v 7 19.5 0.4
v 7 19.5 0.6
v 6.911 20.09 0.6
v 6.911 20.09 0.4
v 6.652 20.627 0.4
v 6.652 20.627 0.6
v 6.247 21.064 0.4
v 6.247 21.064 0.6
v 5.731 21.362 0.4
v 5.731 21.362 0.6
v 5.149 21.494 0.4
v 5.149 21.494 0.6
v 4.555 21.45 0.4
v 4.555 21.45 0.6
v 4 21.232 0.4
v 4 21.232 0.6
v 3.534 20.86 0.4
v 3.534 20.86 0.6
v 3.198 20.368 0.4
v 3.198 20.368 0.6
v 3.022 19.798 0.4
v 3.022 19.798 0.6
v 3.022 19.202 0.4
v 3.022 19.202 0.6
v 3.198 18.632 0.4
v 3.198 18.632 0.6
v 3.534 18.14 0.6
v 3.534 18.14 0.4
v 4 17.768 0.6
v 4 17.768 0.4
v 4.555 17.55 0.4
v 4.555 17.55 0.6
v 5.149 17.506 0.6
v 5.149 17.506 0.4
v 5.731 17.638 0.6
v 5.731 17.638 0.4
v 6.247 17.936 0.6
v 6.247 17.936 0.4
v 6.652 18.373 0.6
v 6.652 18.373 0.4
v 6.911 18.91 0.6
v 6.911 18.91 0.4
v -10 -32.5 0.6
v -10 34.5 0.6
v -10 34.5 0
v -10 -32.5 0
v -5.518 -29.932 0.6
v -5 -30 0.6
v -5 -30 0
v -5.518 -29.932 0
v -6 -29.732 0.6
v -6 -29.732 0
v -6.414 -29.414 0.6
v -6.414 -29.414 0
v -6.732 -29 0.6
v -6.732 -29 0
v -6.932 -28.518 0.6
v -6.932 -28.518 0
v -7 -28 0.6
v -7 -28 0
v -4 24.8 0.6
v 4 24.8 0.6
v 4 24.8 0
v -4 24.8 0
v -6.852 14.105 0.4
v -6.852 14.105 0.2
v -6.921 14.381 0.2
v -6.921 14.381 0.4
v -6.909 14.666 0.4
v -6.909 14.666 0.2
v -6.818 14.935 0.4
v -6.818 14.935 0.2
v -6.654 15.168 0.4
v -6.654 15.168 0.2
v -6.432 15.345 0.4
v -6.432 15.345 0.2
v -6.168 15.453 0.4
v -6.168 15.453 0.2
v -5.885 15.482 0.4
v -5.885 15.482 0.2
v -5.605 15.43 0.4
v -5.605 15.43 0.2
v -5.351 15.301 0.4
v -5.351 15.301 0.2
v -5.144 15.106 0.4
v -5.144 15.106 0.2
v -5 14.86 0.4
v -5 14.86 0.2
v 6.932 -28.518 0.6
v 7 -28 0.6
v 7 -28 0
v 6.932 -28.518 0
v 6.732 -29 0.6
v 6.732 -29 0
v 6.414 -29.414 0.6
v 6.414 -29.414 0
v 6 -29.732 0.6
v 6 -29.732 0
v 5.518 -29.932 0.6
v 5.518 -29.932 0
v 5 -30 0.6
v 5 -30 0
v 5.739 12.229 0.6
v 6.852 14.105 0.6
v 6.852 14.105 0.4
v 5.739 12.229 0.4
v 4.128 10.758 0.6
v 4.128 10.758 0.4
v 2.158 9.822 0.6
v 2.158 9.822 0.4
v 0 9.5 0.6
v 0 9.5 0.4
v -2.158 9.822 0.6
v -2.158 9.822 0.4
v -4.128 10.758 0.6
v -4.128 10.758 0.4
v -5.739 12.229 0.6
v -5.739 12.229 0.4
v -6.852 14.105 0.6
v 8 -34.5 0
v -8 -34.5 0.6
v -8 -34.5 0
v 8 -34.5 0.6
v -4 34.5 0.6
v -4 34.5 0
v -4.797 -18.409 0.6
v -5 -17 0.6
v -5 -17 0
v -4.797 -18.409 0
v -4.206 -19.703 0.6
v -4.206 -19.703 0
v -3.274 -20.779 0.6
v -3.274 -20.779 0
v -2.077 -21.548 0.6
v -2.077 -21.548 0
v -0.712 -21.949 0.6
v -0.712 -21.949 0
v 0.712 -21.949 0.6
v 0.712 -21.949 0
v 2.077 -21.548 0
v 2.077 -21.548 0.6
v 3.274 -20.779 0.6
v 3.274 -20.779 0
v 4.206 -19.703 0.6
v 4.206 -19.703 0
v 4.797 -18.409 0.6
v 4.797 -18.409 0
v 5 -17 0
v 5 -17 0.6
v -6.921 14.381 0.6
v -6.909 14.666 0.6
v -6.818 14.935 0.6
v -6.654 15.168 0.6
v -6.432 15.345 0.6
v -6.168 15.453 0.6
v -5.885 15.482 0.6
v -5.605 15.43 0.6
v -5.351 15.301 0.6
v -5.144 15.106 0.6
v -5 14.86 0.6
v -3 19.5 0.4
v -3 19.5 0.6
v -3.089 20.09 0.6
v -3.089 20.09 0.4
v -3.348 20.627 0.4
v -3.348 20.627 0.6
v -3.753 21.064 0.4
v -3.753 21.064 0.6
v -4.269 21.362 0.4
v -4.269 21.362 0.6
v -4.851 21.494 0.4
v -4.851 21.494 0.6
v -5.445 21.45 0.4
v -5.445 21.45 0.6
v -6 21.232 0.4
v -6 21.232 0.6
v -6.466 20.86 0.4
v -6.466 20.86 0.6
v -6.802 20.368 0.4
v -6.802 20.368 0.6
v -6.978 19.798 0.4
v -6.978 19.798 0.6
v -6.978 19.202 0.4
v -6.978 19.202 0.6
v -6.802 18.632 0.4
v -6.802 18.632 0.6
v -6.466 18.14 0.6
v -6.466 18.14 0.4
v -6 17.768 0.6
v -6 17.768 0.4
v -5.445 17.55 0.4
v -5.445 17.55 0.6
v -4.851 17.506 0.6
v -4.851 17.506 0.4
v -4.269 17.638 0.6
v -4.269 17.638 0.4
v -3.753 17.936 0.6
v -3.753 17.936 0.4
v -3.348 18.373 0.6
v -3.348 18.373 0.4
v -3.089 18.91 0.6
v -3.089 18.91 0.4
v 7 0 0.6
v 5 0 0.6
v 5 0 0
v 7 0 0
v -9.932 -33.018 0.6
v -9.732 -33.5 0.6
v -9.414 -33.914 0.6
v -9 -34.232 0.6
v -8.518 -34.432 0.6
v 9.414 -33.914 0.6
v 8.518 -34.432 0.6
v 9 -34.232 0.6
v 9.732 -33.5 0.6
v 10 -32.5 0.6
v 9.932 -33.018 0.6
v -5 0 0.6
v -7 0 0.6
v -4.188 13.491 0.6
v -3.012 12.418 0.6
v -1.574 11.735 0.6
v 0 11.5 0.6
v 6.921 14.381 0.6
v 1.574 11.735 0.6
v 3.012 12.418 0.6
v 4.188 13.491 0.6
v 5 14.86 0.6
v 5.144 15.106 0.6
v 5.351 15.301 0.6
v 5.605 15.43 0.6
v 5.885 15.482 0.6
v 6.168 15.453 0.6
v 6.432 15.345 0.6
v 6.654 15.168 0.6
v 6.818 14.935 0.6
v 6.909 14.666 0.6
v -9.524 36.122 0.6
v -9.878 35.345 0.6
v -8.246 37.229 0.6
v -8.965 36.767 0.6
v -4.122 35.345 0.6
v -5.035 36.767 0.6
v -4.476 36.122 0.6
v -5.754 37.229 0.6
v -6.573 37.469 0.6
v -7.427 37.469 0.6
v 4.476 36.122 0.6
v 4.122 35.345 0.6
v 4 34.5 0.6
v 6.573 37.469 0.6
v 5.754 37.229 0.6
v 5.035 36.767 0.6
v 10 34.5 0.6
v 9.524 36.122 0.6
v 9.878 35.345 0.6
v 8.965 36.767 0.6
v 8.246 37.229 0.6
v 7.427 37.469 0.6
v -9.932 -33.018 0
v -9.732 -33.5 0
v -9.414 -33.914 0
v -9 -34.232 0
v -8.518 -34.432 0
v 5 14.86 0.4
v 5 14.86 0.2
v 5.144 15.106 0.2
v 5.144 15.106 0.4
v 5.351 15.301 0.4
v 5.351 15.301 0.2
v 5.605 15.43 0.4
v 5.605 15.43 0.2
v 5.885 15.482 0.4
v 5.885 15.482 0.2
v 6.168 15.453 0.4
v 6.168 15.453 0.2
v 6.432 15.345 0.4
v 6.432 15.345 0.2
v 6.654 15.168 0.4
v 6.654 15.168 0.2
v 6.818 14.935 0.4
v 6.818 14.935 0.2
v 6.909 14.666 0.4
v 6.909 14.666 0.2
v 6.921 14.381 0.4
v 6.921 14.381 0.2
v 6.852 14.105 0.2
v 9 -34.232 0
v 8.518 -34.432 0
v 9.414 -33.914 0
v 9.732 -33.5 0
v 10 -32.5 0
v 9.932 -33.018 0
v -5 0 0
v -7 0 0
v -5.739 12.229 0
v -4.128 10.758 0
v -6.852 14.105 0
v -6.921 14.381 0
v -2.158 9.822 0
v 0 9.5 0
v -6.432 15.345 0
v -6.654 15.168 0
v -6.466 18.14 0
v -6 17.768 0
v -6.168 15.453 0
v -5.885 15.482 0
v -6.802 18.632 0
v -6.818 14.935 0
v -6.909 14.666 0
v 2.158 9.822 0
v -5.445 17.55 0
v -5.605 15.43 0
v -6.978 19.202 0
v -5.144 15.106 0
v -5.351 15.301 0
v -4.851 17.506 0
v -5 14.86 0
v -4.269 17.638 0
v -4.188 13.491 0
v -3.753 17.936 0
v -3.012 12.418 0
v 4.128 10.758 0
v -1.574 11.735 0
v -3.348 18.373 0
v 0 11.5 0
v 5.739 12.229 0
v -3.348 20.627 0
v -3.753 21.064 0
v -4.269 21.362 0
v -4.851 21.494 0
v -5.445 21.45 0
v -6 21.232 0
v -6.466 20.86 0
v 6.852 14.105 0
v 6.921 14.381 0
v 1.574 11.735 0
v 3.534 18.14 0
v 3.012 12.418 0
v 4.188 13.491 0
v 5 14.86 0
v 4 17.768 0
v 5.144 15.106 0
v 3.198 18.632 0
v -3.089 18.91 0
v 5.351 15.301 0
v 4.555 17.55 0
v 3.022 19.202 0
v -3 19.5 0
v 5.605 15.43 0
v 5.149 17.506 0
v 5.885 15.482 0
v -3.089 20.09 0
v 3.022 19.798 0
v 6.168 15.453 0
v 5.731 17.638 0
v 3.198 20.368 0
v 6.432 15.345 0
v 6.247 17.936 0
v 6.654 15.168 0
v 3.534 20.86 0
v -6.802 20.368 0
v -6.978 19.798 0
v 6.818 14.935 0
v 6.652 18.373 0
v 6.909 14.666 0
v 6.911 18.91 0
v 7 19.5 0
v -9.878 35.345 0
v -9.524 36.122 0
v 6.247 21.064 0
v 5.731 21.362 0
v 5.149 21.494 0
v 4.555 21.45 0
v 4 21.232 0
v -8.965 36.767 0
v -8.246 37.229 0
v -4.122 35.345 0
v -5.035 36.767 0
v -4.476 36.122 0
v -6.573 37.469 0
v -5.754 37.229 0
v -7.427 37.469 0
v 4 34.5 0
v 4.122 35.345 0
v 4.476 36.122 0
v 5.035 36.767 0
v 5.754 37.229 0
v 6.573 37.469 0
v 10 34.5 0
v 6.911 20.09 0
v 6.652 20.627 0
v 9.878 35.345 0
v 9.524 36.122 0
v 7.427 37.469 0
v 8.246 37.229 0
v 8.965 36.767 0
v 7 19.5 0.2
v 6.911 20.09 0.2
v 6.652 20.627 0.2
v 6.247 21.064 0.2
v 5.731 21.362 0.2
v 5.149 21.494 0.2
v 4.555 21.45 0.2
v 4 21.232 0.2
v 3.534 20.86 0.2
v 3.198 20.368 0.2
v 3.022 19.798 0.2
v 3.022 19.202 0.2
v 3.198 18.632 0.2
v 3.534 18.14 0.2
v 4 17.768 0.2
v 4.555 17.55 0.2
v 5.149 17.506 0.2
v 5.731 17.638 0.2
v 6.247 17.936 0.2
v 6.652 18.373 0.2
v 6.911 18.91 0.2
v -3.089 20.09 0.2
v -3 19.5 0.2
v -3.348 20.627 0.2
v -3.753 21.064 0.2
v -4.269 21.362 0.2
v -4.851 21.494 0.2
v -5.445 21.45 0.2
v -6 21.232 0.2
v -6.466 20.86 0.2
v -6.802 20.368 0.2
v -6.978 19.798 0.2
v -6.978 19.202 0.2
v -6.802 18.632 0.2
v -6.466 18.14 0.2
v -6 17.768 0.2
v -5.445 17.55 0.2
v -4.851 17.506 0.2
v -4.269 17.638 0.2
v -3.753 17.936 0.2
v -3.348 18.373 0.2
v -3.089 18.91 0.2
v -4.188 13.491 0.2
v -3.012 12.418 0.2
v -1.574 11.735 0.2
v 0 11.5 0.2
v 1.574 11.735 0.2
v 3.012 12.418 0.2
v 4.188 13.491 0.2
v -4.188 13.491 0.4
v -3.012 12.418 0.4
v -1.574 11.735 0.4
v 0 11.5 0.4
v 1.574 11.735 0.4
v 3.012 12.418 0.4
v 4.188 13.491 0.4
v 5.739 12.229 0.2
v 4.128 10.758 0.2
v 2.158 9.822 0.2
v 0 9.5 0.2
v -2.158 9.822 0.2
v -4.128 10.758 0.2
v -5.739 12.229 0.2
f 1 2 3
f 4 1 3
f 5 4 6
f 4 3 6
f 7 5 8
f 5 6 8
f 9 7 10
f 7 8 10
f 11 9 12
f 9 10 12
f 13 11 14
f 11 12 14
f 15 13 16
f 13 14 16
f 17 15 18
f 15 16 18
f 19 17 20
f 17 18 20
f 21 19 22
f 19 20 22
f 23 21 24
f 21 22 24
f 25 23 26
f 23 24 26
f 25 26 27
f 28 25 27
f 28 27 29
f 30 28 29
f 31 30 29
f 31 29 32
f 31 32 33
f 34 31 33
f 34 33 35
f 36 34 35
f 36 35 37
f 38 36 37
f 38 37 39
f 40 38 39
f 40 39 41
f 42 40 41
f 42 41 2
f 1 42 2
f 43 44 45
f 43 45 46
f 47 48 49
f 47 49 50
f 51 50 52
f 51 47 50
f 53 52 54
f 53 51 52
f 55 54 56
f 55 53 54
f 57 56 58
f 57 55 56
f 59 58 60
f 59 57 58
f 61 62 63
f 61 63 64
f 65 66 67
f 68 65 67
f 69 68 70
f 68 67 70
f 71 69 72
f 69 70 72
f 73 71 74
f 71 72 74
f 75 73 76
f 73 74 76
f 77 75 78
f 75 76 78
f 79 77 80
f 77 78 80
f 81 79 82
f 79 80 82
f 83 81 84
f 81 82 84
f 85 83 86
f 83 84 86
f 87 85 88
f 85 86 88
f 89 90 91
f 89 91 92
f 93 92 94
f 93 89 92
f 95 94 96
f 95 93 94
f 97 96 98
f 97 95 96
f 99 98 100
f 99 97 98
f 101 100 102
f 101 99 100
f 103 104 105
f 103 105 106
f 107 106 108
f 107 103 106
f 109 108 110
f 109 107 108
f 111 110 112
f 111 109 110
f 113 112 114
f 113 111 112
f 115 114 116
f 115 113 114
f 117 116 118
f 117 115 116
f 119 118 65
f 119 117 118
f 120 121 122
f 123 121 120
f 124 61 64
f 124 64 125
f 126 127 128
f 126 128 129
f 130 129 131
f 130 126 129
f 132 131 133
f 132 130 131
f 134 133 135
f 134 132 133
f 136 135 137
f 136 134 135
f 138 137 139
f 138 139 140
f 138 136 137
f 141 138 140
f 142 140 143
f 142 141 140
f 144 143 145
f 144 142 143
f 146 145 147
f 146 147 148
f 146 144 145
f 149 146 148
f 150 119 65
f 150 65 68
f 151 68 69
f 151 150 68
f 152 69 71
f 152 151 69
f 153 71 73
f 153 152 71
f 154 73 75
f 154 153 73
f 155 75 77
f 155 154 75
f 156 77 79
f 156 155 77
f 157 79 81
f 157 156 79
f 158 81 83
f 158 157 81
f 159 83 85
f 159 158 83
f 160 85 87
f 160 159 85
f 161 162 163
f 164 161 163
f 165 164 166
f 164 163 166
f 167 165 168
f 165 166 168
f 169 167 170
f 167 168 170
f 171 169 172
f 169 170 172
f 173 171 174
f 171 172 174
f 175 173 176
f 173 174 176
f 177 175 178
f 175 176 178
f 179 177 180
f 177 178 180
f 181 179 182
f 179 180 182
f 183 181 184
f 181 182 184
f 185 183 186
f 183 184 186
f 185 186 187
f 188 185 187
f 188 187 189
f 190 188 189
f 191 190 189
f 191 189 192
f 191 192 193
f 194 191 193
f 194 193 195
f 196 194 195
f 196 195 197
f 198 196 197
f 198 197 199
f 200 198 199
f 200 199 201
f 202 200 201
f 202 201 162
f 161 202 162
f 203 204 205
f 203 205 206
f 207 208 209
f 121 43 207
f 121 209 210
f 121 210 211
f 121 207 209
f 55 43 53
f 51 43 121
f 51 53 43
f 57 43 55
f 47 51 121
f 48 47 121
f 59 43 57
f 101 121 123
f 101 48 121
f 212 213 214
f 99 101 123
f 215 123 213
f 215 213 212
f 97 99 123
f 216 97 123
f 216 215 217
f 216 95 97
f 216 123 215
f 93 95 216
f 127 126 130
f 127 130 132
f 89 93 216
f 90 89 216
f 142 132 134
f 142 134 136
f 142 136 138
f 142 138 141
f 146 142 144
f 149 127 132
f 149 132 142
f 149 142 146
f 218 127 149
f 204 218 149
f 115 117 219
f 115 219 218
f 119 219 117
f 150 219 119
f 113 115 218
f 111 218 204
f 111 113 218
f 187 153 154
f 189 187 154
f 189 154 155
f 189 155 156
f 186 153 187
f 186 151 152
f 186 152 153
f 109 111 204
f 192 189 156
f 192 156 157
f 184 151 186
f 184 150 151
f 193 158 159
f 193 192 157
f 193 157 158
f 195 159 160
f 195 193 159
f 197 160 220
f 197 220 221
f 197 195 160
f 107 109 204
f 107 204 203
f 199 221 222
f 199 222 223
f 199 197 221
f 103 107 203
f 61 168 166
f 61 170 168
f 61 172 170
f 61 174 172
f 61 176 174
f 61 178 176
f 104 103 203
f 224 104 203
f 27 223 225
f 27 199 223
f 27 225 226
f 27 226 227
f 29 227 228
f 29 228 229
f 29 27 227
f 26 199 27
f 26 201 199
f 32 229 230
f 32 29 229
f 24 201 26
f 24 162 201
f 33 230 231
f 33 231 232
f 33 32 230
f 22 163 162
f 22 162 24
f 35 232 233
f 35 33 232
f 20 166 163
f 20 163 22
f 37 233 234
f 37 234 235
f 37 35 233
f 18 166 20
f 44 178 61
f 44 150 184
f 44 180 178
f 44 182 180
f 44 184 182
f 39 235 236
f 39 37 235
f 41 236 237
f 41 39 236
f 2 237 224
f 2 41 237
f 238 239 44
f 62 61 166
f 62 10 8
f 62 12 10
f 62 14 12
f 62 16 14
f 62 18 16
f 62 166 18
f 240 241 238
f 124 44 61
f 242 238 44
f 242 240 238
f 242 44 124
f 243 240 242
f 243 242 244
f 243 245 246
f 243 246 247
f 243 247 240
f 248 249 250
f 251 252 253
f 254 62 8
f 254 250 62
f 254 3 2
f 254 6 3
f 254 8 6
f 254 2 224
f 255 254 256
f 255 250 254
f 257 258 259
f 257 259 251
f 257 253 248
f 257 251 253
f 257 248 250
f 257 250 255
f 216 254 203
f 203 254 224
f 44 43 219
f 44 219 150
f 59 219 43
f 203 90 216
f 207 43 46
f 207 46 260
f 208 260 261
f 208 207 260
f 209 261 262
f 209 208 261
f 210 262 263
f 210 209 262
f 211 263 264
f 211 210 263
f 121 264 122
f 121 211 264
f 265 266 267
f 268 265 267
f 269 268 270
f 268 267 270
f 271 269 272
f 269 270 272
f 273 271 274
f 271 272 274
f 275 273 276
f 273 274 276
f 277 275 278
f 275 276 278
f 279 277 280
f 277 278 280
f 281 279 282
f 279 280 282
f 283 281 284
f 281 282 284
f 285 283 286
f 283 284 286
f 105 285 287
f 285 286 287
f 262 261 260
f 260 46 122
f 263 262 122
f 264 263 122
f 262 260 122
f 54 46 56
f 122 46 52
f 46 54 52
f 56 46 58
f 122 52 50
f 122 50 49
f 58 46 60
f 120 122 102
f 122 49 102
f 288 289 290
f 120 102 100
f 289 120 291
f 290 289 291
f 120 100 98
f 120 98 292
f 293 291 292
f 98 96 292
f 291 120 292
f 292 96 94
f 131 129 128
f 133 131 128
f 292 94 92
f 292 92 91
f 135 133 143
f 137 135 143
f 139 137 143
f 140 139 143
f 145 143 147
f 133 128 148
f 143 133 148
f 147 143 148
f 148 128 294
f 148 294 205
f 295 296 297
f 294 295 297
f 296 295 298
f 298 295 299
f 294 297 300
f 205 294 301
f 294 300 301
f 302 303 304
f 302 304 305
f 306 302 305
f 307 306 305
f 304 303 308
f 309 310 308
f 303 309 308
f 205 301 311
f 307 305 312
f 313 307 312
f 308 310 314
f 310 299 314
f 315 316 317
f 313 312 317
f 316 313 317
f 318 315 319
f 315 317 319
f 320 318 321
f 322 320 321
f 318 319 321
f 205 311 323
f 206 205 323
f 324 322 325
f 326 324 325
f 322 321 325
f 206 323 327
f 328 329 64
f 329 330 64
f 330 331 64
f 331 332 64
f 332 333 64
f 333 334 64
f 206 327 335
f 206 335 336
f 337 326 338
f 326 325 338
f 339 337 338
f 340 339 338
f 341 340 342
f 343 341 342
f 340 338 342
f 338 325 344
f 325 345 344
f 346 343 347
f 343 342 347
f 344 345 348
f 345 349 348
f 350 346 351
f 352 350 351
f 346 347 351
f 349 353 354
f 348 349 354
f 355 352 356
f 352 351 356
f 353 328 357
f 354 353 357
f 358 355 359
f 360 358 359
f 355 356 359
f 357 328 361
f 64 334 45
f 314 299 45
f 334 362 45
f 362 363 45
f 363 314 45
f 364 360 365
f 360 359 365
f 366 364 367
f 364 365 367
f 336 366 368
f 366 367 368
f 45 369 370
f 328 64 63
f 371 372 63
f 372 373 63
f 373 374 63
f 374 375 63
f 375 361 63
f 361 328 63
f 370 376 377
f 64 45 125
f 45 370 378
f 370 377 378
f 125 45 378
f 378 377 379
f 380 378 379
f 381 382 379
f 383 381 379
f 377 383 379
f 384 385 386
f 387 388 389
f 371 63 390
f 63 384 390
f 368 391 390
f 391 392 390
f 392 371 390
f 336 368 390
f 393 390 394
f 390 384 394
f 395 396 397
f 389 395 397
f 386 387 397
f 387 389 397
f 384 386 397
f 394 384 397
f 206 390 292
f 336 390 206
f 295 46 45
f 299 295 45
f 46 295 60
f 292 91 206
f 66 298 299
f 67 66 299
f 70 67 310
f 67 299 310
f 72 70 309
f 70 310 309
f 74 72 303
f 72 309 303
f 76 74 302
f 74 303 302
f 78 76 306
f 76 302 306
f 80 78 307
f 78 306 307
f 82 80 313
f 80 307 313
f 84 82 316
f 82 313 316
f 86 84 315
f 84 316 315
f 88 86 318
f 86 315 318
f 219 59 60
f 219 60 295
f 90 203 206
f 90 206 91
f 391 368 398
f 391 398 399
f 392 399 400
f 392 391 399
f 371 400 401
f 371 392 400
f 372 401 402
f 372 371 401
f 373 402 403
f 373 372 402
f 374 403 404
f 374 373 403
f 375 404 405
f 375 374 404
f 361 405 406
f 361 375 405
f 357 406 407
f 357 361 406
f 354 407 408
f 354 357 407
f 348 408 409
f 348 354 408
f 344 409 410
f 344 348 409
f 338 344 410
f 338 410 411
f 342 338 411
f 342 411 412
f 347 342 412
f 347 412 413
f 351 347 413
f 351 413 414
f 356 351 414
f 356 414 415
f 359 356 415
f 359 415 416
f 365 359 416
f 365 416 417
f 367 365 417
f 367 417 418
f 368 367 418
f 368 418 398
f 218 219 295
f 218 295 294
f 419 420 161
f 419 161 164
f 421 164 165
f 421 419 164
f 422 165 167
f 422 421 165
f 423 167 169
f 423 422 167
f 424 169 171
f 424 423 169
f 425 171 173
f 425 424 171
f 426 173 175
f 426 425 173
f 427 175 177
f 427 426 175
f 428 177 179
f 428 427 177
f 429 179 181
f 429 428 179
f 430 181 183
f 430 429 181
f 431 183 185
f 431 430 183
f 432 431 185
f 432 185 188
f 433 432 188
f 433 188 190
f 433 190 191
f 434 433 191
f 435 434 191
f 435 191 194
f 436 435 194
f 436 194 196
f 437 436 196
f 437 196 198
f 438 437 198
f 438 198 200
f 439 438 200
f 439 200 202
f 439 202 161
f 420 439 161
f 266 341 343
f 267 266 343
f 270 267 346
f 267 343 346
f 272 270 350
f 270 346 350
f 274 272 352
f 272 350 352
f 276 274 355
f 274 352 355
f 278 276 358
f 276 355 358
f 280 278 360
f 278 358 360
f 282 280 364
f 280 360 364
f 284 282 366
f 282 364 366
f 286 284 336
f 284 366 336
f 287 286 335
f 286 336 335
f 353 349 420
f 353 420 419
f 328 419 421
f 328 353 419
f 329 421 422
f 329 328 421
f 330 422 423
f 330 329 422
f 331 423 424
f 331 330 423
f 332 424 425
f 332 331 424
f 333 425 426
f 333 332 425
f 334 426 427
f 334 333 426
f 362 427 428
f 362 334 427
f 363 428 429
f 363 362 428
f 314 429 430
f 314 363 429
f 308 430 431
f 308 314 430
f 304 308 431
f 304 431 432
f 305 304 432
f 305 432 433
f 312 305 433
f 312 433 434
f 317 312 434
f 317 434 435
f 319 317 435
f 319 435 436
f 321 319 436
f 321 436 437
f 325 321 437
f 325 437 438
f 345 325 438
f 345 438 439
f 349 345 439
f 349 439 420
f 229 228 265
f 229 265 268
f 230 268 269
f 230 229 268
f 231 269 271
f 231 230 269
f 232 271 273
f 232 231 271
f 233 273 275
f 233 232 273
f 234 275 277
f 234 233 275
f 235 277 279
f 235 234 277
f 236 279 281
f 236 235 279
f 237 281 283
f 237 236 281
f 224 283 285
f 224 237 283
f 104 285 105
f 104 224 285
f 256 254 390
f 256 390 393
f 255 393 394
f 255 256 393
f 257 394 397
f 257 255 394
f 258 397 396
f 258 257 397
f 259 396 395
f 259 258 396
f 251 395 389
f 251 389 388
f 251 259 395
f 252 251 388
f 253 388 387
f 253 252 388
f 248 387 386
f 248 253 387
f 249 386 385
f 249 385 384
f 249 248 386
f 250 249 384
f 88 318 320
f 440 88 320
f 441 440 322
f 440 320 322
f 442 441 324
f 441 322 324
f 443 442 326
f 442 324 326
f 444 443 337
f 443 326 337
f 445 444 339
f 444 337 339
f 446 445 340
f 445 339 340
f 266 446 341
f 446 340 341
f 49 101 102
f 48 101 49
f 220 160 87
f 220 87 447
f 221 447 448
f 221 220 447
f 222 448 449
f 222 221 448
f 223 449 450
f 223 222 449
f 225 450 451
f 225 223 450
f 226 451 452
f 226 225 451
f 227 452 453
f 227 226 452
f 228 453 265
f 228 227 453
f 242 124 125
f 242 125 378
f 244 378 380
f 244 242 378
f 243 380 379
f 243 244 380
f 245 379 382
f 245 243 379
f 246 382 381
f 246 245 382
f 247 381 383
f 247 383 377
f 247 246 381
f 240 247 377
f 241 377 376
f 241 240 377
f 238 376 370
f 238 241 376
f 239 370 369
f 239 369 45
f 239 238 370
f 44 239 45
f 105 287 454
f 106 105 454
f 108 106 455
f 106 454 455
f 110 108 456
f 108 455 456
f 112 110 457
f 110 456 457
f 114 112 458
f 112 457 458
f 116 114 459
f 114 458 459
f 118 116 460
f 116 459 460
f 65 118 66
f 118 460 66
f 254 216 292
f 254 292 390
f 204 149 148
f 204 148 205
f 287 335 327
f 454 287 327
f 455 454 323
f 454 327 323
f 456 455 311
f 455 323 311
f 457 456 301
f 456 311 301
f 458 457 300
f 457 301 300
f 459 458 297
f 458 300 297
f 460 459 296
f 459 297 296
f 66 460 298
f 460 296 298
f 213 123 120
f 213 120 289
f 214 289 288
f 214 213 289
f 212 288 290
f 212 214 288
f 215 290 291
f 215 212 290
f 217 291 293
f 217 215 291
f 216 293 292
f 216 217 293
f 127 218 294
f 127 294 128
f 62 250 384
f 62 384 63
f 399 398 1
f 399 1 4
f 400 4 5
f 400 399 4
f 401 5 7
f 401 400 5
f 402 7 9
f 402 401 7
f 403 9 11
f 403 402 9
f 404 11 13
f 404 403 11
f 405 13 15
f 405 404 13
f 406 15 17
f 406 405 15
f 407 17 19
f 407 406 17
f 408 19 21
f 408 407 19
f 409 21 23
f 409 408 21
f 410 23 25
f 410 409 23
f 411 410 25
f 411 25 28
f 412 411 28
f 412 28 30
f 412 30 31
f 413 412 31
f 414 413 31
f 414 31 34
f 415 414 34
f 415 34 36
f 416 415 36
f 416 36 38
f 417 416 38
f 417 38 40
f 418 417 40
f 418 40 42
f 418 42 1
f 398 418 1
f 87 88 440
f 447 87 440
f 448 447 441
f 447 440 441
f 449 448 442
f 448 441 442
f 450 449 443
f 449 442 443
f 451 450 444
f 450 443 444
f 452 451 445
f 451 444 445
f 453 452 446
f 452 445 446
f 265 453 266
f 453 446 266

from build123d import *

# Parameters (mm, degrees)
F0_R     = 2
F1_DEPTH = 0.4


# Not quite as in the source:
# - a pattern or mirror of a feature is missing from the dataset's text; its kind, count and spacing are read off the source's solid


with BuildPart() as f1:
    # F0 (on Top) → F1 (new body)
    with BuildSketch(Plane.XY):
        with BuildLine():
            Line((-8, -34.5), (8, -34.5))
            ThreePointArc((8, -34.5), (9.4142135624, -33.9142135624), (10, -32.5))
            Line((10, -32.5), (10, 34.5))
            ThreePointArc((10, 34.5), (7, 37.5), (4, 34.5))
            Line((4, 34.5), (4, 24.8))
            Line((4, 24.8), (-4, 24.8))
            Line((-4, 24.8), (-4, 34.5))
            ThreePointArc((-4, 34.5), (-7, 37.5), (-10, 34.5))
            Line((-10, 34.5), (-10, -32.5))
            ThreePointArc((-10, -32.5), (-9.4142135624, -33.9142135624), (-8, -34.5))
        make_face()
        with BuildLine():
            Line((-7, -28), (-7, 0))
            Line((-7, 0), (-5, 0))
            Line((-5, 0), (5, 0))
            Line((5, 0), (7, 0))
            Line((7, 0), (7, -28))
            ThreePointArc((7, -28), (6.4142135624, -29.4142135624), (5, -30))
            Line((5, -30), (-5, -30))
            ThreePointArc((-5, -30), (-6.4142135624, -29.4142135624), (-7, -28))
        make_face(mode=Mode.SUBTRACT)
        with Locations((-5, 19.5)):
            Circle(F0_R, mode=Mode.SUBTRACT)
        with BuildLine():
            ThreePointArc((-5, 14.8603921946), (0, 11.5), (5, 14.8603921946))
            ThreePointArc((5, 14.8603921946), (6.3036310751, 15.4086129713), (6.8518518519, 14.1049818963))
            ThreePointArc((6.8518518519, 14.1049818963), (0, 9.5), (-6.8518518519, 14.1049818963))
            ThreePointArc((-6.8518518519, 14.1049818963), (-6.3036310751, 15.4086129713), (-5, 14.8603921946))
        make_face(mode=Mode.SUBTRACT)
        with Locations((5, 19.5)):
            Circle(F0_R, mode=Mode.SUBTRACT)
        with BuildLine():
            Line((5, 0), (-5, 0))
            Line((-5, 0), (-5, -17))
            ThreePointArc((-5, -17), (0, -22), (5, -17))
            Line((5, -17), (5, 0))
        make_face()
    extrude(amount=F1_DEPTH)

    # F1_copies: F1 across plane


with BuildPart() as f1_1:
    add(f1.part)
    add(f1.part.mirror(Plane.XY.offset(0.3)))


solid = f1_1.part
